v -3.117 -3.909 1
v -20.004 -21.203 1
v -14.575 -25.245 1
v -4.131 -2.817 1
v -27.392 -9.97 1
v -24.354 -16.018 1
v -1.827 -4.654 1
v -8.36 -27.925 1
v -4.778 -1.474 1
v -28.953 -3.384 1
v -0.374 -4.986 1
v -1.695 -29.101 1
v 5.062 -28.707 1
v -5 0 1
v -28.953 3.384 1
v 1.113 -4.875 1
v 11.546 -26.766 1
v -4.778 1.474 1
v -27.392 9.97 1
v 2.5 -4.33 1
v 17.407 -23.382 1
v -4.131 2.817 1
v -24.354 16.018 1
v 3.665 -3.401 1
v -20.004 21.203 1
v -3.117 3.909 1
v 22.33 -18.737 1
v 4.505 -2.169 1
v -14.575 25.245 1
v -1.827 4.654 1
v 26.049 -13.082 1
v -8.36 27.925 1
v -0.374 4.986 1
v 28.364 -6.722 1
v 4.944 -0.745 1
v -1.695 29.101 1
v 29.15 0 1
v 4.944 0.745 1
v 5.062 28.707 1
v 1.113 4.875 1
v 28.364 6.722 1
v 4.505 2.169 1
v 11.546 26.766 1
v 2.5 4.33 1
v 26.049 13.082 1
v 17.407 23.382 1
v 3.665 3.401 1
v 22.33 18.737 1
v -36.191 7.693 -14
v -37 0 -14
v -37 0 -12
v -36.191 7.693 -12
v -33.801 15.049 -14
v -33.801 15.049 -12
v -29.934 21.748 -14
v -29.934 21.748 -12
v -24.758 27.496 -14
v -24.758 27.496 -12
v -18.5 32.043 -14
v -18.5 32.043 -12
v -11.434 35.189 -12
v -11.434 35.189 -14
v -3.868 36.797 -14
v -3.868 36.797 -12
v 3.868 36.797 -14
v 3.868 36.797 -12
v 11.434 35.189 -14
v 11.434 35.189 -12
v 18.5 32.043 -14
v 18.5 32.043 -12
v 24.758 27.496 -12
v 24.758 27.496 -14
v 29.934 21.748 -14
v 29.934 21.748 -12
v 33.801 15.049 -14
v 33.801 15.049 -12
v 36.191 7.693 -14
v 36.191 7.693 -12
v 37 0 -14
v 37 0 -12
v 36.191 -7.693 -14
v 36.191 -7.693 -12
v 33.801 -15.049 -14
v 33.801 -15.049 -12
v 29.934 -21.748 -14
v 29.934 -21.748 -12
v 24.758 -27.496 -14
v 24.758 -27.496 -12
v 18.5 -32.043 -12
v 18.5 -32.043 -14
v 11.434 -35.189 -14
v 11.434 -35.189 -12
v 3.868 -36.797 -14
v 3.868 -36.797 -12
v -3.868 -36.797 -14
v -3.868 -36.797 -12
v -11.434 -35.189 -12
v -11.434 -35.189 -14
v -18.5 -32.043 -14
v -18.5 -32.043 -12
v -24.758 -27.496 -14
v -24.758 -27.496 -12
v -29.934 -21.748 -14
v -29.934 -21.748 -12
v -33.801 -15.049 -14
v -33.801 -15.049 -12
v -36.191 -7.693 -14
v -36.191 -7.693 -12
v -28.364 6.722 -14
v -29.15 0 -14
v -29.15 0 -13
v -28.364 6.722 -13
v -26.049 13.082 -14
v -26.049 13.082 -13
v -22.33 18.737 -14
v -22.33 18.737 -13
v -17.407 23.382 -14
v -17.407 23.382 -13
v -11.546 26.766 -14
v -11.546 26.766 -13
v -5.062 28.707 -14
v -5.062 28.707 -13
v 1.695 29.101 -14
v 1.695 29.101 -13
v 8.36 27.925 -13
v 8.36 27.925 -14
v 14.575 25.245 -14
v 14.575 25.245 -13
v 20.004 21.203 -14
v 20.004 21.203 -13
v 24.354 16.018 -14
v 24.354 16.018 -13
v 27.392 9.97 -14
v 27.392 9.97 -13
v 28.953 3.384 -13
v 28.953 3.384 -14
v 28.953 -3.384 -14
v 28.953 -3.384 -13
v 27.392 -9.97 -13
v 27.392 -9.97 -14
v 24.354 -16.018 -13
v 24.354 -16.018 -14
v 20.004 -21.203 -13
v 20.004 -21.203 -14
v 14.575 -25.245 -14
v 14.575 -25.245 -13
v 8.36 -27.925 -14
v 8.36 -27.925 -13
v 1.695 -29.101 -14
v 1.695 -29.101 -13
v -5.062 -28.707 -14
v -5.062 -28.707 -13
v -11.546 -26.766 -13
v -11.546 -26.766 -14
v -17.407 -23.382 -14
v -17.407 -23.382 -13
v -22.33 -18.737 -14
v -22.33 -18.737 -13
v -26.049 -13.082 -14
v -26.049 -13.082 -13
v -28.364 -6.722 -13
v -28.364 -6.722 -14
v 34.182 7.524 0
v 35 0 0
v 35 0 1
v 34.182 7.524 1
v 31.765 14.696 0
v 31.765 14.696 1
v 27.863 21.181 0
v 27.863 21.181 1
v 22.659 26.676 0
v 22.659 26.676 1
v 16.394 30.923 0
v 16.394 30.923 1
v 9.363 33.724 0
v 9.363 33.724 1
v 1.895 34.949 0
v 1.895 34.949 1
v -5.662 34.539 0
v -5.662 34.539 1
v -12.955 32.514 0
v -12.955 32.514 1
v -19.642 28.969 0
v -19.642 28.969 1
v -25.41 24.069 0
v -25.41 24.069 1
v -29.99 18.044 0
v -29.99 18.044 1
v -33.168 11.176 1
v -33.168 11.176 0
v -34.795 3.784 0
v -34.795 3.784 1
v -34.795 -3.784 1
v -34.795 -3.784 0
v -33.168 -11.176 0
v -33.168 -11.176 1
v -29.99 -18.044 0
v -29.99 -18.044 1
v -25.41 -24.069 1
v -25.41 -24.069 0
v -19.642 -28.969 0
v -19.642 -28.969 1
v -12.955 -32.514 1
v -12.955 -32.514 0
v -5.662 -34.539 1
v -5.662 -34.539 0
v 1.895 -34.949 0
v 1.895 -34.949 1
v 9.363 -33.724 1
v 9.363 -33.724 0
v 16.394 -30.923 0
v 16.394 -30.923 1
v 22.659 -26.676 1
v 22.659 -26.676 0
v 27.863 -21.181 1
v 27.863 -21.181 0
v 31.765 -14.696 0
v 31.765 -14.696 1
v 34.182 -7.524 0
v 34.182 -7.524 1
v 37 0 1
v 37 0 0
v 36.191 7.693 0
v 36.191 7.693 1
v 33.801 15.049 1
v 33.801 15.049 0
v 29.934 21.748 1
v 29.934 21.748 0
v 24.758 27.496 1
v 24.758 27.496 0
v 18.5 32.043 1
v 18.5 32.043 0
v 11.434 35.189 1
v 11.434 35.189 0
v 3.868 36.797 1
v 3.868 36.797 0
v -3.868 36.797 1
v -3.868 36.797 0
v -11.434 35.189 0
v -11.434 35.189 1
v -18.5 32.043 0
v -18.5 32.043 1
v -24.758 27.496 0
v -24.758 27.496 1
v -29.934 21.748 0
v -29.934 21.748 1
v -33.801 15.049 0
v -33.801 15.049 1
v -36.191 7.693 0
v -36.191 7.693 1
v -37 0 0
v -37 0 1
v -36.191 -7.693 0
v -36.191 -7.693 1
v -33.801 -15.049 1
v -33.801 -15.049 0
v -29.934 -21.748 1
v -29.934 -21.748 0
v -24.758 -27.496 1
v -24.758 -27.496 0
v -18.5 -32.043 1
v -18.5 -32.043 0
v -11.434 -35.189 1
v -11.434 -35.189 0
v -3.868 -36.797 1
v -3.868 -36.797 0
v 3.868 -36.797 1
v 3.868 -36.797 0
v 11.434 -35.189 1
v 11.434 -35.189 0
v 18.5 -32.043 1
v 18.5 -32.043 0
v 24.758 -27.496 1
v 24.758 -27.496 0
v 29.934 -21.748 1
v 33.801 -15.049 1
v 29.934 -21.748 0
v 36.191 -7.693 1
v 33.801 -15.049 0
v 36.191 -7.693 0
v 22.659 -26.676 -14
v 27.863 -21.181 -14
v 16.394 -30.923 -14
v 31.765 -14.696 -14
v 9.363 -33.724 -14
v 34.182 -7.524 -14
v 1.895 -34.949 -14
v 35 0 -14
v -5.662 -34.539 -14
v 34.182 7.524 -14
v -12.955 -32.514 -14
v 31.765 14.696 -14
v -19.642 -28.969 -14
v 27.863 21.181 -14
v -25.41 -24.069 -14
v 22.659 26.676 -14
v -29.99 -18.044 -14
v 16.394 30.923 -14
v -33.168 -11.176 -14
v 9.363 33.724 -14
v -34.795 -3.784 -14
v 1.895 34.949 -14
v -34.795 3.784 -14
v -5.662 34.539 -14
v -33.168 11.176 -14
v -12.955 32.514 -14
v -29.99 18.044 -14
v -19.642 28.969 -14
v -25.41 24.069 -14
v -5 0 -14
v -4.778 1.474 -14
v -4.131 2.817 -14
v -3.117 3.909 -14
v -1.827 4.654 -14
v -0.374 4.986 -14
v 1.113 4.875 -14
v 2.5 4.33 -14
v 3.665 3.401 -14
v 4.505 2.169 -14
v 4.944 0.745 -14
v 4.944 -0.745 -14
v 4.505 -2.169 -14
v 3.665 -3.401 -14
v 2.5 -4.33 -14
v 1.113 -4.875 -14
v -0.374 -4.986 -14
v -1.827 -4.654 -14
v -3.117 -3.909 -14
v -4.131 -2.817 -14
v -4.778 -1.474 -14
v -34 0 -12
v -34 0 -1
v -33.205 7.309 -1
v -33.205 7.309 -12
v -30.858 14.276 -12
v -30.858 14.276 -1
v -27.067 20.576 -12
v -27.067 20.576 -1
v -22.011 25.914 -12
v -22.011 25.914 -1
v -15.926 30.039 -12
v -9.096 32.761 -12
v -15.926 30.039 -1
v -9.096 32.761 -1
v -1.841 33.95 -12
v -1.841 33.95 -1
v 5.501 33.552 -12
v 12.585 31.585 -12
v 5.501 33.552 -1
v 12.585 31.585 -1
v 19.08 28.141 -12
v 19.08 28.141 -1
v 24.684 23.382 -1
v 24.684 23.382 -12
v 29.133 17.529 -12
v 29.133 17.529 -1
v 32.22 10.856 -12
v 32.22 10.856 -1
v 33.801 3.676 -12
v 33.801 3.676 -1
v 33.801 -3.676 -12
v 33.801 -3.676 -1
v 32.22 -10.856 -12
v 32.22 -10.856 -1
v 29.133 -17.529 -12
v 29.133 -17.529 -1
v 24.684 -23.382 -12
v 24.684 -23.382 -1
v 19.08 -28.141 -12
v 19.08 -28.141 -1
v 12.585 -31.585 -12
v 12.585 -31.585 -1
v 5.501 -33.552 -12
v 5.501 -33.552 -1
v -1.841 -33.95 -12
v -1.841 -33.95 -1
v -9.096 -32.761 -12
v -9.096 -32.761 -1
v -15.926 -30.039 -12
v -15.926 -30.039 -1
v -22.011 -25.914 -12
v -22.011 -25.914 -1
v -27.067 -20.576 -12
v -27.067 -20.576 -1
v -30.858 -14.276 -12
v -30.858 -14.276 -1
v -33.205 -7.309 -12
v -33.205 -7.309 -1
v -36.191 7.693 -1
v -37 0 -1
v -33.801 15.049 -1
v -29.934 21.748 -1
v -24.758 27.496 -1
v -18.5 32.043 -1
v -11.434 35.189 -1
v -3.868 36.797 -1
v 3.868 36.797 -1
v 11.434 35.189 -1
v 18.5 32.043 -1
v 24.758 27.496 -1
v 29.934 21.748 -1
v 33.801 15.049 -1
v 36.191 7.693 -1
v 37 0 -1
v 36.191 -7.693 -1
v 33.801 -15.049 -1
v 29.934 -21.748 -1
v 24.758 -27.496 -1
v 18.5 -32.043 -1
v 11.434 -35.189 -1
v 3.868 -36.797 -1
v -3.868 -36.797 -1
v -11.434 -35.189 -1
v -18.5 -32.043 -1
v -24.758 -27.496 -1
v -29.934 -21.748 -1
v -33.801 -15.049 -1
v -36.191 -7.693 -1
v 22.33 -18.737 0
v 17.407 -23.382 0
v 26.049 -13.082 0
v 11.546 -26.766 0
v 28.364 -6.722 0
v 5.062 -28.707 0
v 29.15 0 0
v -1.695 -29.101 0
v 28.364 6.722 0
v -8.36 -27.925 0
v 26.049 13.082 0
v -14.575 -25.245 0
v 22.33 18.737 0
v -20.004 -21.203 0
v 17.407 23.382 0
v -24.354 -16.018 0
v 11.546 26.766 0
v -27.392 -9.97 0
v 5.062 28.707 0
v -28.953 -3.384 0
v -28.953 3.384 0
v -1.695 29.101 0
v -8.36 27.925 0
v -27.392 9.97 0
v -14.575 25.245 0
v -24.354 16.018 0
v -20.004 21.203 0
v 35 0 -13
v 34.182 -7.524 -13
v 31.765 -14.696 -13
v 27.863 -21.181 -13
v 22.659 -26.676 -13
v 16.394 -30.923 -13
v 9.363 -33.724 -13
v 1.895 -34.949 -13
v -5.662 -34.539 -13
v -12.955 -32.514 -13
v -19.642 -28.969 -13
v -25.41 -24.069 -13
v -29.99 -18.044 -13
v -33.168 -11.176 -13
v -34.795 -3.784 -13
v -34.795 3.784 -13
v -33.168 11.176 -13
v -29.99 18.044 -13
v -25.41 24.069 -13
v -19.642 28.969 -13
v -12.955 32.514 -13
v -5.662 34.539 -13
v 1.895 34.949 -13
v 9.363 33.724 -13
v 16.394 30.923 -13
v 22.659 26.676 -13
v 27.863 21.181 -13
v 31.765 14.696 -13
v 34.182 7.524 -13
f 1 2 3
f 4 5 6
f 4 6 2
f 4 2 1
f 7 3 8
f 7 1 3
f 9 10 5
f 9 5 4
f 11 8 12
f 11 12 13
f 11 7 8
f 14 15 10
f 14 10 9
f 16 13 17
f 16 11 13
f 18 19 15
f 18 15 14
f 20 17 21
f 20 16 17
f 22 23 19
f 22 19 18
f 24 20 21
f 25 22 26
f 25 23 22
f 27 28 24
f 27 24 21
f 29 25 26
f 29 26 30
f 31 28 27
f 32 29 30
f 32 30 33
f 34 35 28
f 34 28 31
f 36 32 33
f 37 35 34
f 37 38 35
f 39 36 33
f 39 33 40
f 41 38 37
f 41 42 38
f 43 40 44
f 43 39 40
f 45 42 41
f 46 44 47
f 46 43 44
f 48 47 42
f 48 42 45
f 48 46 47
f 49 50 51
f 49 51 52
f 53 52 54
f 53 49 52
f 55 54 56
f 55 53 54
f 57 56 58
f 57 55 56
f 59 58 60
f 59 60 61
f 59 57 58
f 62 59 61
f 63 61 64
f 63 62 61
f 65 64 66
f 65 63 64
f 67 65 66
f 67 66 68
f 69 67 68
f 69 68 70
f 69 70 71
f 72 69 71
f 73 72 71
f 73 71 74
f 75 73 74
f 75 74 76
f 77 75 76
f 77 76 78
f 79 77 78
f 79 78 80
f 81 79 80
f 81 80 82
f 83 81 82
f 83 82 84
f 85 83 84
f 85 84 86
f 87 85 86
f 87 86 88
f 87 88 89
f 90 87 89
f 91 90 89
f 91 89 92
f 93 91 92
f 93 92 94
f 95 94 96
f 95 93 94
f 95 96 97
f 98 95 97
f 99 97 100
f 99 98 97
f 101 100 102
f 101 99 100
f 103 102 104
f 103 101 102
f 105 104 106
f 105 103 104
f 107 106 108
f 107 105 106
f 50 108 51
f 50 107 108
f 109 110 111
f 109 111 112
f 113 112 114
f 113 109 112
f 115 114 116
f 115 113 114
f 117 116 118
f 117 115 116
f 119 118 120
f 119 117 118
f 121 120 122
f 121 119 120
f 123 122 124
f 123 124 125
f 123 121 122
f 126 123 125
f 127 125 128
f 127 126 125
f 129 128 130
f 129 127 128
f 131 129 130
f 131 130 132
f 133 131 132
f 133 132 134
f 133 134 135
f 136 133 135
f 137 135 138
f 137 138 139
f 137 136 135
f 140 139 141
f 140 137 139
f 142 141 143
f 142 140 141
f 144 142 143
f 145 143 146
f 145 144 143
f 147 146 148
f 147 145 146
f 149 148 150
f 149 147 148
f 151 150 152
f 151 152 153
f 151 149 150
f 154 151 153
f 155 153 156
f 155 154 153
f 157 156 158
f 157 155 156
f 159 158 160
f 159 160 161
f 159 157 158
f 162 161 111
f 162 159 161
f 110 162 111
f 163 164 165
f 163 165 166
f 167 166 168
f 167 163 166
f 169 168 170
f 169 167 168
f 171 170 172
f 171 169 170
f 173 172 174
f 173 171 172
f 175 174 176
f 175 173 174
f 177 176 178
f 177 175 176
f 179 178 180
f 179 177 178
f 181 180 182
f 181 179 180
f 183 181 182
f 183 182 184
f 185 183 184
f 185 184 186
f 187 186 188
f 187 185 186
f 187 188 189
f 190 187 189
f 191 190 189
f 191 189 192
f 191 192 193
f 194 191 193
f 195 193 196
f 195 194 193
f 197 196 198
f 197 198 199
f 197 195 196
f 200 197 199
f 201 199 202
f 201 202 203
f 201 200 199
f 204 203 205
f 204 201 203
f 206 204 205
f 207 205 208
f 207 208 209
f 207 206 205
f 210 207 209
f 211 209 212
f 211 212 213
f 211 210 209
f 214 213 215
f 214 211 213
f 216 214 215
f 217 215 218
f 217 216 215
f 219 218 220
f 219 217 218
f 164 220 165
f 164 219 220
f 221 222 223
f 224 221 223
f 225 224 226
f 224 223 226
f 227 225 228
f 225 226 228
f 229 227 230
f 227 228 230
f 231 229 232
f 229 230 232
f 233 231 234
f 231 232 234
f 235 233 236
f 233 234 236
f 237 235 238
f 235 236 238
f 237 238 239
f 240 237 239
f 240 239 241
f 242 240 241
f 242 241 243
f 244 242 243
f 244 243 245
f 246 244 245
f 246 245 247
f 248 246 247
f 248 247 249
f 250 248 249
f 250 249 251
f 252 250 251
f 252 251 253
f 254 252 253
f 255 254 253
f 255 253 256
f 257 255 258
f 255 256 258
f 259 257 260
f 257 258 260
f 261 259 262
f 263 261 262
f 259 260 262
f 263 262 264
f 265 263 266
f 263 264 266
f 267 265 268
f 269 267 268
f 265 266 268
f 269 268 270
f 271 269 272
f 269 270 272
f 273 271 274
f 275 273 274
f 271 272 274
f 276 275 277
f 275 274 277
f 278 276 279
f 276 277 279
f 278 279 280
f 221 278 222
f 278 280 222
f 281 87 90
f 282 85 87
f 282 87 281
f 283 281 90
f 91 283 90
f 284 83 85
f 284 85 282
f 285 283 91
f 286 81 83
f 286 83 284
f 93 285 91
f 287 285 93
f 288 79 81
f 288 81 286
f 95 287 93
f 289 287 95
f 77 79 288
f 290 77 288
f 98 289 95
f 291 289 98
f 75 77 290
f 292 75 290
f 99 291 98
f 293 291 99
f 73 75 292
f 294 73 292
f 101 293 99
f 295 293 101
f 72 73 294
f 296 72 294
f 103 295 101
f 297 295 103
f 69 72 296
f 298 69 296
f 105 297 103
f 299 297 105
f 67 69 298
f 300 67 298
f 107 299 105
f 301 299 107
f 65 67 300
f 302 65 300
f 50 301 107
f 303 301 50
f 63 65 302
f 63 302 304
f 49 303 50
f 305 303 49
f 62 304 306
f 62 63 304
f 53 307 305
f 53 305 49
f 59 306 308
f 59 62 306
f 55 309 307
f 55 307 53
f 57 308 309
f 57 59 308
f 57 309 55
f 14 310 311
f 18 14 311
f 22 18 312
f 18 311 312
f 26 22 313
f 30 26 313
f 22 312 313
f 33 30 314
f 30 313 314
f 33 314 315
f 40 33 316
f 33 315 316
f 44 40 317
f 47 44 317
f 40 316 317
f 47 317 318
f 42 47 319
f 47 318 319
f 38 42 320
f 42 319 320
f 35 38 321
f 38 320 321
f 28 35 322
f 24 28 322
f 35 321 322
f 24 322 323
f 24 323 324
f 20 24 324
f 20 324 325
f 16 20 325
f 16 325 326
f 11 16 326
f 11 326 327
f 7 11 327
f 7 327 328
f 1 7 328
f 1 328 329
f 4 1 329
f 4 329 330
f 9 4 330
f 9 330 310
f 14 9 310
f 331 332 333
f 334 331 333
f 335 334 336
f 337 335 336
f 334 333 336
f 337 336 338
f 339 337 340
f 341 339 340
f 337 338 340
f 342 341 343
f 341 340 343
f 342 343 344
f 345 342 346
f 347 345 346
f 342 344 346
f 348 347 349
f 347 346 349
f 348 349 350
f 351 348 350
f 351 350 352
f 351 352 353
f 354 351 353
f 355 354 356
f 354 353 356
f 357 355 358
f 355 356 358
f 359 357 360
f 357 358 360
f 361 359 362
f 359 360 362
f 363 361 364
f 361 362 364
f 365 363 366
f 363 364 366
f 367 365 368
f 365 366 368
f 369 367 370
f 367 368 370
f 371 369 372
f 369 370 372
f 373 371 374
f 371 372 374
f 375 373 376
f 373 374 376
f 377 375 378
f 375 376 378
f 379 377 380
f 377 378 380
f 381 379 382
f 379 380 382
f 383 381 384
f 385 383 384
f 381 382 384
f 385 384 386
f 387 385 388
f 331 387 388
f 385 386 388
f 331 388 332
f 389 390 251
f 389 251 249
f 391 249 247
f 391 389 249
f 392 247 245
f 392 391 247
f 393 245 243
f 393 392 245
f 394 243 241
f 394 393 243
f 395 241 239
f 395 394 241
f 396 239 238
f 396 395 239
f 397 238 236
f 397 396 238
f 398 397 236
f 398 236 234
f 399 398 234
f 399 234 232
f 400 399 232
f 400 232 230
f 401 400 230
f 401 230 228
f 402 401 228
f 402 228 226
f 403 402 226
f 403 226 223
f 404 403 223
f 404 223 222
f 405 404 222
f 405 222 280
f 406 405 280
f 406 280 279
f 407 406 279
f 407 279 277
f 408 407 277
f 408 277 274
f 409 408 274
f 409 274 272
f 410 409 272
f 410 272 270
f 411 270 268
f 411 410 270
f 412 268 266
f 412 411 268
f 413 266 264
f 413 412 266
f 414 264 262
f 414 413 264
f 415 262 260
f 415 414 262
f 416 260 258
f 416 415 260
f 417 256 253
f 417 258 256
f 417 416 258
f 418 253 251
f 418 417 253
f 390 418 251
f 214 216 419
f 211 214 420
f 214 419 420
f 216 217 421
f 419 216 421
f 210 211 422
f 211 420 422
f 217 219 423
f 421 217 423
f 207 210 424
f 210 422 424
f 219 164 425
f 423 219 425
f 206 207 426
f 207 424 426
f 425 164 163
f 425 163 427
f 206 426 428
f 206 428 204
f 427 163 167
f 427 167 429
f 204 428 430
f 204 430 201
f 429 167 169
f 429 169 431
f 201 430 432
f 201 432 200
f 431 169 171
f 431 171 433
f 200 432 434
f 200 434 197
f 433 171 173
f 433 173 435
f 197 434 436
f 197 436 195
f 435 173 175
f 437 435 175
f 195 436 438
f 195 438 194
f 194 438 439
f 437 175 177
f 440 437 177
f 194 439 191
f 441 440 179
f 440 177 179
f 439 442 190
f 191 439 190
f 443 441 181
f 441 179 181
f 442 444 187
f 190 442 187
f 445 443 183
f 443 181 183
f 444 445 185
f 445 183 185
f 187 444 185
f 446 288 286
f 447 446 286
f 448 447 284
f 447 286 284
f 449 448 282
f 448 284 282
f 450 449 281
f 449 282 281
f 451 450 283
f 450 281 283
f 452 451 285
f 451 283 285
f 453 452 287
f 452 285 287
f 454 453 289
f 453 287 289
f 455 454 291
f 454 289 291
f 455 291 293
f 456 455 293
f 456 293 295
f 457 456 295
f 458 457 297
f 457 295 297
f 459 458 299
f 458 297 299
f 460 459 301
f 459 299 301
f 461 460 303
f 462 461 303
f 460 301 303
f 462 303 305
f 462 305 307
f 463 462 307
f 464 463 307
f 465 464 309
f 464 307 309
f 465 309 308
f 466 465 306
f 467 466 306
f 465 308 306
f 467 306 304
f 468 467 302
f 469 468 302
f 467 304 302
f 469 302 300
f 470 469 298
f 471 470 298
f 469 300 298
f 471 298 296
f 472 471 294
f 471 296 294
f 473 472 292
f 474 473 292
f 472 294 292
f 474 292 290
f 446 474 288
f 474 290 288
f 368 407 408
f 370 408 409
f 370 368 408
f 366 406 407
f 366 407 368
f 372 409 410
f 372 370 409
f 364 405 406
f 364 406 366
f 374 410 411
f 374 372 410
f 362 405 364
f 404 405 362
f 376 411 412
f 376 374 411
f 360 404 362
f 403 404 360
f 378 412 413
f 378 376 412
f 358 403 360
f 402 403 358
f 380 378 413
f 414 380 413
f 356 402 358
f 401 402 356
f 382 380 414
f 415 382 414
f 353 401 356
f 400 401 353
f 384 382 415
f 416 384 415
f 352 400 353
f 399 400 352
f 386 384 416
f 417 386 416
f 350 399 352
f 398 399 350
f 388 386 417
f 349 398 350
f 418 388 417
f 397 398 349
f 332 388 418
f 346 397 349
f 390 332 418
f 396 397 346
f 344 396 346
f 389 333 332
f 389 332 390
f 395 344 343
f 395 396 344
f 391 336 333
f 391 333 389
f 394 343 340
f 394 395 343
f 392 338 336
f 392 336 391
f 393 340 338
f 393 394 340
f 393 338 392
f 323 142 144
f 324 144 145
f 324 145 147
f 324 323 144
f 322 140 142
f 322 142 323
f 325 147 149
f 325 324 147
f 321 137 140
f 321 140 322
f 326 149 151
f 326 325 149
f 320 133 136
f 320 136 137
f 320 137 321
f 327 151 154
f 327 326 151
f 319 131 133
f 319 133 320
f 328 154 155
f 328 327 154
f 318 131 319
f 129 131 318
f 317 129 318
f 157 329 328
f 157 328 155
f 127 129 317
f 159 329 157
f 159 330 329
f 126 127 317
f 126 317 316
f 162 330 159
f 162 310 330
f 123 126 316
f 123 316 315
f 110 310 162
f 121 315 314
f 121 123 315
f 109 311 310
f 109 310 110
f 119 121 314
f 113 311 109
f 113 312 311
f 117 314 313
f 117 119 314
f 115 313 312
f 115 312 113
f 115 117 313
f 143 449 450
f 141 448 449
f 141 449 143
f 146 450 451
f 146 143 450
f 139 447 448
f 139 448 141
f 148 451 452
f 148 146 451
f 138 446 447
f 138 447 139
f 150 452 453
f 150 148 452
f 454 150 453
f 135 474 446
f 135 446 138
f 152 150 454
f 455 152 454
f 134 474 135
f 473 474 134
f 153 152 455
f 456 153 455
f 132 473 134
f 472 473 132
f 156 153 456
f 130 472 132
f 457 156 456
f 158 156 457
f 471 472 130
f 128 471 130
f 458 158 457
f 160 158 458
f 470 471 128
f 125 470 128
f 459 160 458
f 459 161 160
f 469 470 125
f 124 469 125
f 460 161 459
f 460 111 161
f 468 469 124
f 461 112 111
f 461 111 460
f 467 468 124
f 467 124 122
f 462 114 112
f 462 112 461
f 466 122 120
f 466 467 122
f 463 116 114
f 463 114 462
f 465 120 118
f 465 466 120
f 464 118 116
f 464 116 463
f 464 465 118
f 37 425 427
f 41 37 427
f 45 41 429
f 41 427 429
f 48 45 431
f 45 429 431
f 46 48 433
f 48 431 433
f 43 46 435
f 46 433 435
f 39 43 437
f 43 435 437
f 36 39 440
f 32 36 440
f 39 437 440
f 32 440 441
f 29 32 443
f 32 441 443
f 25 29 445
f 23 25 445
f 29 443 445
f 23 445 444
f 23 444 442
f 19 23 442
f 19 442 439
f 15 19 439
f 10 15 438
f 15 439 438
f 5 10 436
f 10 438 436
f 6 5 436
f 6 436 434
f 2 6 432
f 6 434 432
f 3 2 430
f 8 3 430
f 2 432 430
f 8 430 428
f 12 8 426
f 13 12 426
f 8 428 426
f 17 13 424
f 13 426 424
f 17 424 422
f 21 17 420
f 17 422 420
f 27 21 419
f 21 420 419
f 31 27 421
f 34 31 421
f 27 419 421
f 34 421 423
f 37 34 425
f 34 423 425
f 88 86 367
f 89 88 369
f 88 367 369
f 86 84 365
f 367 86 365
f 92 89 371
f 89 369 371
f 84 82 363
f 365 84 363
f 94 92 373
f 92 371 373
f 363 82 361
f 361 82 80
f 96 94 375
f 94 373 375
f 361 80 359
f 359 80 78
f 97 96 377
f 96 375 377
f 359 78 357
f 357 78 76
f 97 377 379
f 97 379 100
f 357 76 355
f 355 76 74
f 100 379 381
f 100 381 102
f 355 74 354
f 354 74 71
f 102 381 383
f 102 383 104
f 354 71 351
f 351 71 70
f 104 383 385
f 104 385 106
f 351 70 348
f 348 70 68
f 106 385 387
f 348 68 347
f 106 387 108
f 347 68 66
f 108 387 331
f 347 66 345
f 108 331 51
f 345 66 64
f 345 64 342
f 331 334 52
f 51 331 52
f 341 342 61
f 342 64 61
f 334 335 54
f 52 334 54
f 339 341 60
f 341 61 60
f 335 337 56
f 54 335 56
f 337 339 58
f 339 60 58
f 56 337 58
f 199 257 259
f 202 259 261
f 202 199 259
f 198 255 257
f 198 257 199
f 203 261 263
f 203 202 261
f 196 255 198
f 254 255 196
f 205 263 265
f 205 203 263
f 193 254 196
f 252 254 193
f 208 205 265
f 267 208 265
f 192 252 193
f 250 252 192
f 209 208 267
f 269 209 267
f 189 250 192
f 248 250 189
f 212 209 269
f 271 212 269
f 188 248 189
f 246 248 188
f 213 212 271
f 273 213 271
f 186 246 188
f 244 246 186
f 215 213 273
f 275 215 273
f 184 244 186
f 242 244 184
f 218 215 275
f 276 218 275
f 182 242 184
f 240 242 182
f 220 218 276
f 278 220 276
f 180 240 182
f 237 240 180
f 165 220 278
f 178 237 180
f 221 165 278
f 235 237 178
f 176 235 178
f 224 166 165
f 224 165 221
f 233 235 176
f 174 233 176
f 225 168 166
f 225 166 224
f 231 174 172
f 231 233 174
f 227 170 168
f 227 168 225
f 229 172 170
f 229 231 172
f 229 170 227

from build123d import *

# Parameters (mm, degrees)
SKETCH_1_R          = 37
SKETCH_1_R_2        = 35
EXTRUDE_1_DEPTH     = 1
SKETCH_1_R_3        = 29.15
EXTRUDE_1_2_DEPTH   = 1
EXTRUDE_START       = 1
SKETCH_2_R          = 37
EXTRUDE_2_DEPTH     = 1
SKETCH_3_R          = 34
EXTRUDE_3_DEPTH     = 11
SKETCH_5_R          = 37
EXTRUDE_4_DEPTH     = 1
SKETCH_4_R          = 37
SKETCH_4_R_2        = 35
SKETCH_4_R_3        = 29.15
EXTRUDE_5_DEPTH     = 1
SKETCH_6_R          = 5
CUT_EXTRUDE_1_DEPTH = 55.433445601


with BuildPart() as part:
    # 스케치1 → 보스-돌출1 (new body)
    with BuildSketch(Plane.XY):
        Circle(SKETCH_1_R)
        Circle(SKETCH_1_R_2, mode=Mode.SUBTRACT)
    extrude(amount=EXTRUDE_1_DEPTH)



with BuildPart() as body_2:
    # 스케치1 → Extrude 1 2 (new body)
    with BuildSketch(Plane.XY):
        Circle(SKETCH_1_R_3)
    extrude(amount=EXTRUDE_1_2_DEPTH)


with BuildPart() as part_1:
    add(part.part)

    add(body_2.part)  # 보스-돌출2 merges body 2
    # 스케치2 → 보스-돌출2 (add)
    with BuildSketch(Plane(origin=(0, 0, 0), x_dir=(-1, 0, 0), z_dir=(0, 0, -1)).offset(EXTRUDE_START)):
        Circle(SKETCH_2_R)
    extrude(amount=-EXTRUDE_2_DEPTH)

    # 스케치3 → 보스-돌출3 (add)
    with BuildSketch(Plane(origin=(0, 0, -1), x_dir=(-1, 0, 0), z_dir=(0, 0, -1))):
        Circle(SKETCH_3_R)
    extrude(amount=EXTRUDE_3_DEPTH)

    # 스케치5 → 보스-돌출4 (add)
    with BuildSketch(Plane(origin=(0, 0, -12), x_dir=(-1, 0, 0), z_dir=(0, 0, -1)).offset(EXTRUDE_START)):
        Circle(SKETCH_5_R)
    extrude(amount=-EXTRUDE_4_DEPTH)

    # 스케치4 → 보스-돌출5 (add)
    # profile 1 of 2: a face of its own
    with BuildSketch(Plane(origin=(0, 0, -13), x_dir=(-1, 0, 0), z_dir=(0, 0, -1)).offset(EXTRUDE_START)):
        Circle(SKETCH_4_R)
        with Locations(Location((0, 0, 0), (0, 0, 180))):
            Circle(SKETCH_4_R_2, mode=Mode.SUBTRACT)
    # profile 2 of 2: a face of its own
    with BuildSketch(Plane(origin=(0, 0, -13), x_dir=(-1, 0, 0), z_dir=(0, 0, -1)).offset(EXTRUDE_START)):
        Circle(SKETCH_4_R_3)
    extrude(amount=-EXTRUDE_5_DEPTH)

    # 스케치6 → 컷-돌출1 (cut, through all)
    with BuildSketch(Plane(origin=(0, 0, -14), x_dir=(-1, 0, 0), z_dir=(0, 0, -1))):
        Circle(SKETCH_6_R)
    extrude(amount=-CUT_EXTRUDE_1_DEPTH, mode=Mode.SUBTRACT)


solid = part_1.part
